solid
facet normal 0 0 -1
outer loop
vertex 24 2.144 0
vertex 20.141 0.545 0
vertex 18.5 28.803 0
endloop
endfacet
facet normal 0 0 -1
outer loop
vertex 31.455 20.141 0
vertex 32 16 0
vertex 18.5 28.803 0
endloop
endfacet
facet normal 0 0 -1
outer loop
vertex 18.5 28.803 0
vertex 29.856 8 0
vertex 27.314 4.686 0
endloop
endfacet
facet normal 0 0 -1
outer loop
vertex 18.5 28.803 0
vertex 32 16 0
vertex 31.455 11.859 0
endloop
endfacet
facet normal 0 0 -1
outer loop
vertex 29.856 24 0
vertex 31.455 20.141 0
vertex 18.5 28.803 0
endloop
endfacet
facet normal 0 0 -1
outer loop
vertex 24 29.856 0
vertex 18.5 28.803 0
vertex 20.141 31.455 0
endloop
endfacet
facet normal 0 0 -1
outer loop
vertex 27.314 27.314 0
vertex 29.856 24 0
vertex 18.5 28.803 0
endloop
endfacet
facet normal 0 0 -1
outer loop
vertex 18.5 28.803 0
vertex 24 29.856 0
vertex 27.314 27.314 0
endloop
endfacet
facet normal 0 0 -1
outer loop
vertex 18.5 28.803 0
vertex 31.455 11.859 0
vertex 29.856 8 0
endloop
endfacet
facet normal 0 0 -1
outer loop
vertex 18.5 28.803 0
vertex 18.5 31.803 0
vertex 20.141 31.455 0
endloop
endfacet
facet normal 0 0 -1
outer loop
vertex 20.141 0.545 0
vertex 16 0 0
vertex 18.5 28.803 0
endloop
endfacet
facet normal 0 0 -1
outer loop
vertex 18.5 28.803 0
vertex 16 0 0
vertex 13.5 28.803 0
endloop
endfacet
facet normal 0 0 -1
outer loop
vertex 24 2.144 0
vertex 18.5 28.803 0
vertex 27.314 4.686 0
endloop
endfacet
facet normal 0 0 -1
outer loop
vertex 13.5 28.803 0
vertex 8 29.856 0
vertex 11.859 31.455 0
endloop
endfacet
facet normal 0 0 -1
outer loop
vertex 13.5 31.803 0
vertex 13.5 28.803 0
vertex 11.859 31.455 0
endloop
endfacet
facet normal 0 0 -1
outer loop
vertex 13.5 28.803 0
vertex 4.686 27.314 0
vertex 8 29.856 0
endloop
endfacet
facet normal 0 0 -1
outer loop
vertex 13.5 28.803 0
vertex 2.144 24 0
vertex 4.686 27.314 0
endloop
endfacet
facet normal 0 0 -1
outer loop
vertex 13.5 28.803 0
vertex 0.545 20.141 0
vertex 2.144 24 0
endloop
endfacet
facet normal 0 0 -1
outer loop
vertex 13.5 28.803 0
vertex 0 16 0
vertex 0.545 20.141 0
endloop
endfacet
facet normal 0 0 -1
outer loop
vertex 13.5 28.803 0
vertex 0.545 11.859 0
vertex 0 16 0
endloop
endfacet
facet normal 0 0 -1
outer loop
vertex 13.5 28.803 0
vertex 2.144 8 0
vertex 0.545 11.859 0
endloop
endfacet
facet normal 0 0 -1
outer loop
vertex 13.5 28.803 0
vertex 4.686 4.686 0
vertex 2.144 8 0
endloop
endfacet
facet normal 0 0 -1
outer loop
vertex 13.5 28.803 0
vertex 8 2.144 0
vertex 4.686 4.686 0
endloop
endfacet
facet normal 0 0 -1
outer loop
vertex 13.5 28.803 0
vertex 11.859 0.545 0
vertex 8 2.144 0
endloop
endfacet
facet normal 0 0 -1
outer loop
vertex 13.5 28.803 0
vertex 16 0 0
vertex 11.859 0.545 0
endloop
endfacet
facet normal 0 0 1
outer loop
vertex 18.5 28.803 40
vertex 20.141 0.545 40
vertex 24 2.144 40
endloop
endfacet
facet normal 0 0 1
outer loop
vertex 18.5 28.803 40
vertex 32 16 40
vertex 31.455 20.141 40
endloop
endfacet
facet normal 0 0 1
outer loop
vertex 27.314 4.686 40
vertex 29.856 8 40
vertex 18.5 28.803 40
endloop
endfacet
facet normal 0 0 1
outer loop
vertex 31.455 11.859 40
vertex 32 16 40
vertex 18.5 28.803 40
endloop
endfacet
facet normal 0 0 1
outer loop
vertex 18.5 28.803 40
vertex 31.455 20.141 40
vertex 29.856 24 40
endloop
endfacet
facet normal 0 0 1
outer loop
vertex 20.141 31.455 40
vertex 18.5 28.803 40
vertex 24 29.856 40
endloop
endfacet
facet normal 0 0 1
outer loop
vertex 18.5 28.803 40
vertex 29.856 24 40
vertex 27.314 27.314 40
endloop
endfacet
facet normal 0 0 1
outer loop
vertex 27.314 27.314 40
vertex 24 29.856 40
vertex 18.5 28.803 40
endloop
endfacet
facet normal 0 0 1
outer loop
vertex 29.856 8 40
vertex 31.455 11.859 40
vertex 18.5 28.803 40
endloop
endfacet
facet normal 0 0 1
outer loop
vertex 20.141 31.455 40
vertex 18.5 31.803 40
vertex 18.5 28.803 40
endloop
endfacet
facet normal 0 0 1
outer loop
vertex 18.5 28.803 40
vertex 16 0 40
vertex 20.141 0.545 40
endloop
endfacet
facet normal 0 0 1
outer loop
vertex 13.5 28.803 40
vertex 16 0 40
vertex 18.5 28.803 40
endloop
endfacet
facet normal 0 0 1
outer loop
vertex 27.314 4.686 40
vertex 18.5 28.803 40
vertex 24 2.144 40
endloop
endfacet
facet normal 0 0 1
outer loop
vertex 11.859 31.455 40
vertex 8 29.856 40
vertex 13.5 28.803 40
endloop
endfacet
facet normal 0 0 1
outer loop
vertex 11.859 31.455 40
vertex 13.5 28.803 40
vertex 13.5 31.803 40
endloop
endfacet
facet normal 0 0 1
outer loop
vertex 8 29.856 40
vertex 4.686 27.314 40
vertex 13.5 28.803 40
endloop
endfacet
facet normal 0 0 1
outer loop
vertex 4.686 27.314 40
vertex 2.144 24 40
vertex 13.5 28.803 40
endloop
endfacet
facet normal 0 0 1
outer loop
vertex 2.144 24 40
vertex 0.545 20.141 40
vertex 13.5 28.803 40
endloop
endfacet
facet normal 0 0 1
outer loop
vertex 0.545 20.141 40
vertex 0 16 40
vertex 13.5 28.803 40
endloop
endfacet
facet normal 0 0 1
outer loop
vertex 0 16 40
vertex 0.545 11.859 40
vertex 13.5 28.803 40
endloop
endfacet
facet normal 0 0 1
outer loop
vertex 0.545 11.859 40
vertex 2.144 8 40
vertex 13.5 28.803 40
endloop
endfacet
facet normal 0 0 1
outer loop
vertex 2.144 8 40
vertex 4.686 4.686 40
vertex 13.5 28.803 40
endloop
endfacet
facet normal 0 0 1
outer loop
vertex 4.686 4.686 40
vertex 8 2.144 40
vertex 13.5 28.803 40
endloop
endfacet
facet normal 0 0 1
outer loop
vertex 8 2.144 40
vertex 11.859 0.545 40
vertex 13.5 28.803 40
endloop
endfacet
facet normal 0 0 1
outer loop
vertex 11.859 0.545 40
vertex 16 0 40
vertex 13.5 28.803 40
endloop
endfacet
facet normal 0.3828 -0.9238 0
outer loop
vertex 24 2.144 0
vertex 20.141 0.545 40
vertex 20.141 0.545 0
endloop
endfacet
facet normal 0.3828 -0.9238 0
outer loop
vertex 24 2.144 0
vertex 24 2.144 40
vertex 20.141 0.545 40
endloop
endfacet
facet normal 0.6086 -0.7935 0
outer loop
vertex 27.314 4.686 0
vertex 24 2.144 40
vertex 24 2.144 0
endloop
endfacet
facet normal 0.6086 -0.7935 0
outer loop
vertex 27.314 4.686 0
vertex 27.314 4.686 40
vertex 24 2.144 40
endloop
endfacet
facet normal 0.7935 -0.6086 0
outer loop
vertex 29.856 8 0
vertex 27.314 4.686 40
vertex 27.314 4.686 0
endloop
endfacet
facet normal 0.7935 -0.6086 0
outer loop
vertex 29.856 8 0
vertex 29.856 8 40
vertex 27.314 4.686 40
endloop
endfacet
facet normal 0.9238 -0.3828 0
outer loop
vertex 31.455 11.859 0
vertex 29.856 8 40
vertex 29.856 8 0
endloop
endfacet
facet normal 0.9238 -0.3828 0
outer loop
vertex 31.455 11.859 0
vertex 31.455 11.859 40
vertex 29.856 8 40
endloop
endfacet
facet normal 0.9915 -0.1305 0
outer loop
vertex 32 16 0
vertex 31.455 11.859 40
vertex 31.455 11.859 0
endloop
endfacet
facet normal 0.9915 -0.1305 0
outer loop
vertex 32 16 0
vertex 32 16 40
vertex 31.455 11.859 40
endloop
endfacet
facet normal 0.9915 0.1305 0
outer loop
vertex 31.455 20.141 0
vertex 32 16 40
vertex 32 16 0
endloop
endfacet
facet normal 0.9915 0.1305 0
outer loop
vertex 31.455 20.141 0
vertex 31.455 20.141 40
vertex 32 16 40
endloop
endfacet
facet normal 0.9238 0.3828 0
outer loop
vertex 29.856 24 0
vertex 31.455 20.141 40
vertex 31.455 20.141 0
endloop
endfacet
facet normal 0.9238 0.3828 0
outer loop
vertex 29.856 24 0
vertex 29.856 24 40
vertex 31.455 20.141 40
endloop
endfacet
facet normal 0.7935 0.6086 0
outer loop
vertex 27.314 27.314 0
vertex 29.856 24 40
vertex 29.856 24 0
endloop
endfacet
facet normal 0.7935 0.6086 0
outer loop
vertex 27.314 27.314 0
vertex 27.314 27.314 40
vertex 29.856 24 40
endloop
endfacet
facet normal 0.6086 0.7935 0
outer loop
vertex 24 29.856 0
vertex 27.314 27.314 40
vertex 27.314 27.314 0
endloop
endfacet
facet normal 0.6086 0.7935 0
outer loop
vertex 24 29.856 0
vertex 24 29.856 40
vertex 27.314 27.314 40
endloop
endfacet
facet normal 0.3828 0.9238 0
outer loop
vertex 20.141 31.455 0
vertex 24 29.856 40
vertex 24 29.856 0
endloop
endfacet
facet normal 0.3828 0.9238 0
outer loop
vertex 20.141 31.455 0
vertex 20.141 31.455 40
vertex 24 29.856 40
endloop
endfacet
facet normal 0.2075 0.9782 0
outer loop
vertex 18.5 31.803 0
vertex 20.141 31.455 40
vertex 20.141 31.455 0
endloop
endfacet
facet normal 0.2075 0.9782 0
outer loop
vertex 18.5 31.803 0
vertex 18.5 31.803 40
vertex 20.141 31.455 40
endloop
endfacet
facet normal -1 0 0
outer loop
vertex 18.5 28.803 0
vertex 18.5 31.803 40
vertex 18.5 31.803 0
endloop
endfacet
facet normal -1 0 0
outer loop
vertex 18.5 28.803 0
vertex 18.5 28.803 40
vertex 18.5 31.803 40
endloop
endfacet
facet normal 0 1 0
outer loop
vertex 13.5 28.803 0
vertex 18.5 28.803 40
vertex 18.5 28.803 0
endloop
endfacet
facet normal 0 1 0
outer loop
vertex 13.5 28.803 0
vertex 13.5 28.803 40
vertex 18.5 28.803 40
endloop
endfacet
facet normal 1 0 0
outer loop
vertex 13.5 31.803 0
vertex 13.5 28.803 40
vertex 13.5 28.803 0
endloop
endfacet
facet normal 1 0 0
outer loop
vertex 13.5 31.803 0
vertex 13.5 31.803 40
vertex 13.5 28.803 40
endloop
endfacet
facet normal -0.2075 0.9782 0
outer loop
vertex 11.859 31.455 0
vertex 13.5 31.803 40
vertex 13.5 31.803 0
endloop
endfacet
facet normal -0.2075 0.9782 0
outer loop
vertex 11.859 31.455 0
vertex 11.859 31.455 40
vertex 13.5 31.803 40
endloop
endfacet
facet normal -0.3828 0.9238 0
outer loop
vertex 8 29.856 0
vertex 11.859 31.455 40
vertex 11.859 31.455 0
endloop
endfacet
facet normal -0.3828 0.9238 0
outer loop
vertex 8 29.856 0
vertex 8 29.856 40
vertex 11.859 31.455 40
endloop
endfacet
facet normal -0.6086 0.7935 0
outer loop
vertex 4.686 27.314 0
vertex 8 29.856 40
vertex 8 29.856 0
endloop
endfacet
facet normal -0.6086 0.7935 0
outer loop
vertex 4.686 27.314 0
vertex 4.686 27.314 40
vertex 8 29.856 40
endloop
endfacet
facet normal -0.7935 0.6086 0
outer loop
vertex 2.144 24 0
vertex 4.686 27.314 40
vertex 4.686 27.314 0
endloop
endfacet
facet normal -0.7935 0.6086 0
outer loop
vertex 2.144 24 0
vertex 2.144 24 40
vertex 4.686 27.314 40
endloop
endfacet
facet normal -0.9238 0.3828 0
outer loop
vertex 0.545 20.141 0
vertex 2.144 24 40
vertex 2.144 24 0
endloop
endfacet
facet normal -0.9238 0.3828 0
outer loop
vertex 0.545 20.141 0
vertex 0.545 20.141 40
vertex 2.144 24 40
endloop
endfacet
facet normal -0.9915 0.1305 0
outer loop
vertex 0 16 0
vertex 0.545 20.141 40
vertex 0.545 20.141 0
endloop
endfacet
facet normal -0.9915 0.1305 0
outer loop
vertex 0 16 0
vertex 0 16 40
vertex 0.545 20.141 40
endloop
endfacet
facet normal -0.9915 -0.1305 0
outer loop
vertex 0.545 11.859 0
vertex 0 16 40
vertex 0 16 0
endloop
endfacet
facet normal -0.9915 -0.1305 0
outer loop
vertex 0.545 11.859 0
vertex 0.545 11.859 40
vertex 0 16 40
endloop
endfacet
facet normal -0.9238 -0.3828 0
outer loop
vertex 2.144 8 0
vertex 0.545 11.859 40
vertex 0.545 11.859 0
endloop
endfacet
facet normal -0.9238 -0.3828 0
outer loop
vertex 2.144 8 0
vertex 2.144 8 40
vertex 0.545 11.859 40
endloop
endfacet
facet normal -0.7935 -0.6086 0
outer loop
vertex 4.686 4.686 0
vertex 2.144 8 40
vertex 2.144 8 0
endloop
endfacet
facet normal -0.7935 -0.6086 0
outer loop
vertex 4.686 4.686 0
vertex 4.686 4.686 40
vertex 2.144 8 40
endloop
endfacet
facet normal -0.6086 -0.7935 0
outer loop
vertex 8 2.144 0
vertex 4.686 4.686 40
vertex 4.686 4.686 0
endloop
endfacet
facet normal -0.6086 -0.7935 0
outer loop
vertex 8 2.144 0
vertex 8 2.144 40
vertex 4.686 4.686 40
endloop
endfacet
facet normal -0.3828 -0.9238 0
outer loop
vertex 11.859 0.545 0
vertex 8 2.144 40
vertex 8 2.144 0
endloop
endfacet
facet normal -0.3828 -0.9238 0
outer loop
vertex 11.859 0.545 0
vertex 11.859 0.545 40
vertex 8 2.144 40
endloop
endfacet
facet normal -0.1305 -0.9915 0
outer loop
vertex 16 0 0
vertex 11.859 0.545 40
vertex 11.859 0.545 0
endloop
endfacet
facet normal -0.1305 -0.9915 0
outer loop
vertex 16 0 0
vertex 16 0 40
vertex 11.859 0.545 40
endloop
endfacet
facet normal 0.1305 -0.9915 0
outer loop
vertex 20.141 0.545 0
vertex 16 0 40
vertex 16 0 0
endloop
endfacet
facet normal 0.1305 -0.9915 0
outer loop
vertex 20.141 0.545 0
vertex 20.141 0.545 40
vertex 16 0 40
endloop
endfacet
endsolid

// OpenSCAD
$fn = 32;

// ----------------------------------------------------------------------
// Keyway shaft: d32 shaft, key 5 x 3 mm
// ----------------------------------------------------------------------

// --- parameters (mm) ---
shaft_r = 16;             // shaft radius
key_w = 5;                // keyway width
key_d = 3;                // keyway depth below the surface line
plate_t = 40;             // shaft length, Z (extrusion height)
fit_tol = 0.05;           // declared fit tolerance (prompt contract)
free_tol = 0.3;           // declared free tolerance (prompt contract)

shaft_d = 2 * shaft_r;  // shaft diameter
circle_step = 15;  // polygon sampling step, degrees

profile = [[11.859, 31.455], [8, 29.856], [4.686, 27.314], [2.144, 24], [0.545, 20.141], [0, 16], [0.545, 11.859], [2.144, 8], [4.686, 4.686], [8, 2.144], [11.859, 0.545], [16, 0], [20.141, 0.545], [24, 2.144], [27.314, 4.686], [29.856, 8], [31.455, 11.859], [32, 16], [31.455, 20.141], [29.856, 24], [27.314, 27.314], [24, 29.856], [20.141, 31.455], [18.5, 31.803], [18.5, 28.803], [13.5, 28.803], [13.5, 31.803]];  // primary outline, 27 points, counter clockwise

// --- the one profile operation ---
linear_extrude(height = plate_t) polygon(points = profile);
